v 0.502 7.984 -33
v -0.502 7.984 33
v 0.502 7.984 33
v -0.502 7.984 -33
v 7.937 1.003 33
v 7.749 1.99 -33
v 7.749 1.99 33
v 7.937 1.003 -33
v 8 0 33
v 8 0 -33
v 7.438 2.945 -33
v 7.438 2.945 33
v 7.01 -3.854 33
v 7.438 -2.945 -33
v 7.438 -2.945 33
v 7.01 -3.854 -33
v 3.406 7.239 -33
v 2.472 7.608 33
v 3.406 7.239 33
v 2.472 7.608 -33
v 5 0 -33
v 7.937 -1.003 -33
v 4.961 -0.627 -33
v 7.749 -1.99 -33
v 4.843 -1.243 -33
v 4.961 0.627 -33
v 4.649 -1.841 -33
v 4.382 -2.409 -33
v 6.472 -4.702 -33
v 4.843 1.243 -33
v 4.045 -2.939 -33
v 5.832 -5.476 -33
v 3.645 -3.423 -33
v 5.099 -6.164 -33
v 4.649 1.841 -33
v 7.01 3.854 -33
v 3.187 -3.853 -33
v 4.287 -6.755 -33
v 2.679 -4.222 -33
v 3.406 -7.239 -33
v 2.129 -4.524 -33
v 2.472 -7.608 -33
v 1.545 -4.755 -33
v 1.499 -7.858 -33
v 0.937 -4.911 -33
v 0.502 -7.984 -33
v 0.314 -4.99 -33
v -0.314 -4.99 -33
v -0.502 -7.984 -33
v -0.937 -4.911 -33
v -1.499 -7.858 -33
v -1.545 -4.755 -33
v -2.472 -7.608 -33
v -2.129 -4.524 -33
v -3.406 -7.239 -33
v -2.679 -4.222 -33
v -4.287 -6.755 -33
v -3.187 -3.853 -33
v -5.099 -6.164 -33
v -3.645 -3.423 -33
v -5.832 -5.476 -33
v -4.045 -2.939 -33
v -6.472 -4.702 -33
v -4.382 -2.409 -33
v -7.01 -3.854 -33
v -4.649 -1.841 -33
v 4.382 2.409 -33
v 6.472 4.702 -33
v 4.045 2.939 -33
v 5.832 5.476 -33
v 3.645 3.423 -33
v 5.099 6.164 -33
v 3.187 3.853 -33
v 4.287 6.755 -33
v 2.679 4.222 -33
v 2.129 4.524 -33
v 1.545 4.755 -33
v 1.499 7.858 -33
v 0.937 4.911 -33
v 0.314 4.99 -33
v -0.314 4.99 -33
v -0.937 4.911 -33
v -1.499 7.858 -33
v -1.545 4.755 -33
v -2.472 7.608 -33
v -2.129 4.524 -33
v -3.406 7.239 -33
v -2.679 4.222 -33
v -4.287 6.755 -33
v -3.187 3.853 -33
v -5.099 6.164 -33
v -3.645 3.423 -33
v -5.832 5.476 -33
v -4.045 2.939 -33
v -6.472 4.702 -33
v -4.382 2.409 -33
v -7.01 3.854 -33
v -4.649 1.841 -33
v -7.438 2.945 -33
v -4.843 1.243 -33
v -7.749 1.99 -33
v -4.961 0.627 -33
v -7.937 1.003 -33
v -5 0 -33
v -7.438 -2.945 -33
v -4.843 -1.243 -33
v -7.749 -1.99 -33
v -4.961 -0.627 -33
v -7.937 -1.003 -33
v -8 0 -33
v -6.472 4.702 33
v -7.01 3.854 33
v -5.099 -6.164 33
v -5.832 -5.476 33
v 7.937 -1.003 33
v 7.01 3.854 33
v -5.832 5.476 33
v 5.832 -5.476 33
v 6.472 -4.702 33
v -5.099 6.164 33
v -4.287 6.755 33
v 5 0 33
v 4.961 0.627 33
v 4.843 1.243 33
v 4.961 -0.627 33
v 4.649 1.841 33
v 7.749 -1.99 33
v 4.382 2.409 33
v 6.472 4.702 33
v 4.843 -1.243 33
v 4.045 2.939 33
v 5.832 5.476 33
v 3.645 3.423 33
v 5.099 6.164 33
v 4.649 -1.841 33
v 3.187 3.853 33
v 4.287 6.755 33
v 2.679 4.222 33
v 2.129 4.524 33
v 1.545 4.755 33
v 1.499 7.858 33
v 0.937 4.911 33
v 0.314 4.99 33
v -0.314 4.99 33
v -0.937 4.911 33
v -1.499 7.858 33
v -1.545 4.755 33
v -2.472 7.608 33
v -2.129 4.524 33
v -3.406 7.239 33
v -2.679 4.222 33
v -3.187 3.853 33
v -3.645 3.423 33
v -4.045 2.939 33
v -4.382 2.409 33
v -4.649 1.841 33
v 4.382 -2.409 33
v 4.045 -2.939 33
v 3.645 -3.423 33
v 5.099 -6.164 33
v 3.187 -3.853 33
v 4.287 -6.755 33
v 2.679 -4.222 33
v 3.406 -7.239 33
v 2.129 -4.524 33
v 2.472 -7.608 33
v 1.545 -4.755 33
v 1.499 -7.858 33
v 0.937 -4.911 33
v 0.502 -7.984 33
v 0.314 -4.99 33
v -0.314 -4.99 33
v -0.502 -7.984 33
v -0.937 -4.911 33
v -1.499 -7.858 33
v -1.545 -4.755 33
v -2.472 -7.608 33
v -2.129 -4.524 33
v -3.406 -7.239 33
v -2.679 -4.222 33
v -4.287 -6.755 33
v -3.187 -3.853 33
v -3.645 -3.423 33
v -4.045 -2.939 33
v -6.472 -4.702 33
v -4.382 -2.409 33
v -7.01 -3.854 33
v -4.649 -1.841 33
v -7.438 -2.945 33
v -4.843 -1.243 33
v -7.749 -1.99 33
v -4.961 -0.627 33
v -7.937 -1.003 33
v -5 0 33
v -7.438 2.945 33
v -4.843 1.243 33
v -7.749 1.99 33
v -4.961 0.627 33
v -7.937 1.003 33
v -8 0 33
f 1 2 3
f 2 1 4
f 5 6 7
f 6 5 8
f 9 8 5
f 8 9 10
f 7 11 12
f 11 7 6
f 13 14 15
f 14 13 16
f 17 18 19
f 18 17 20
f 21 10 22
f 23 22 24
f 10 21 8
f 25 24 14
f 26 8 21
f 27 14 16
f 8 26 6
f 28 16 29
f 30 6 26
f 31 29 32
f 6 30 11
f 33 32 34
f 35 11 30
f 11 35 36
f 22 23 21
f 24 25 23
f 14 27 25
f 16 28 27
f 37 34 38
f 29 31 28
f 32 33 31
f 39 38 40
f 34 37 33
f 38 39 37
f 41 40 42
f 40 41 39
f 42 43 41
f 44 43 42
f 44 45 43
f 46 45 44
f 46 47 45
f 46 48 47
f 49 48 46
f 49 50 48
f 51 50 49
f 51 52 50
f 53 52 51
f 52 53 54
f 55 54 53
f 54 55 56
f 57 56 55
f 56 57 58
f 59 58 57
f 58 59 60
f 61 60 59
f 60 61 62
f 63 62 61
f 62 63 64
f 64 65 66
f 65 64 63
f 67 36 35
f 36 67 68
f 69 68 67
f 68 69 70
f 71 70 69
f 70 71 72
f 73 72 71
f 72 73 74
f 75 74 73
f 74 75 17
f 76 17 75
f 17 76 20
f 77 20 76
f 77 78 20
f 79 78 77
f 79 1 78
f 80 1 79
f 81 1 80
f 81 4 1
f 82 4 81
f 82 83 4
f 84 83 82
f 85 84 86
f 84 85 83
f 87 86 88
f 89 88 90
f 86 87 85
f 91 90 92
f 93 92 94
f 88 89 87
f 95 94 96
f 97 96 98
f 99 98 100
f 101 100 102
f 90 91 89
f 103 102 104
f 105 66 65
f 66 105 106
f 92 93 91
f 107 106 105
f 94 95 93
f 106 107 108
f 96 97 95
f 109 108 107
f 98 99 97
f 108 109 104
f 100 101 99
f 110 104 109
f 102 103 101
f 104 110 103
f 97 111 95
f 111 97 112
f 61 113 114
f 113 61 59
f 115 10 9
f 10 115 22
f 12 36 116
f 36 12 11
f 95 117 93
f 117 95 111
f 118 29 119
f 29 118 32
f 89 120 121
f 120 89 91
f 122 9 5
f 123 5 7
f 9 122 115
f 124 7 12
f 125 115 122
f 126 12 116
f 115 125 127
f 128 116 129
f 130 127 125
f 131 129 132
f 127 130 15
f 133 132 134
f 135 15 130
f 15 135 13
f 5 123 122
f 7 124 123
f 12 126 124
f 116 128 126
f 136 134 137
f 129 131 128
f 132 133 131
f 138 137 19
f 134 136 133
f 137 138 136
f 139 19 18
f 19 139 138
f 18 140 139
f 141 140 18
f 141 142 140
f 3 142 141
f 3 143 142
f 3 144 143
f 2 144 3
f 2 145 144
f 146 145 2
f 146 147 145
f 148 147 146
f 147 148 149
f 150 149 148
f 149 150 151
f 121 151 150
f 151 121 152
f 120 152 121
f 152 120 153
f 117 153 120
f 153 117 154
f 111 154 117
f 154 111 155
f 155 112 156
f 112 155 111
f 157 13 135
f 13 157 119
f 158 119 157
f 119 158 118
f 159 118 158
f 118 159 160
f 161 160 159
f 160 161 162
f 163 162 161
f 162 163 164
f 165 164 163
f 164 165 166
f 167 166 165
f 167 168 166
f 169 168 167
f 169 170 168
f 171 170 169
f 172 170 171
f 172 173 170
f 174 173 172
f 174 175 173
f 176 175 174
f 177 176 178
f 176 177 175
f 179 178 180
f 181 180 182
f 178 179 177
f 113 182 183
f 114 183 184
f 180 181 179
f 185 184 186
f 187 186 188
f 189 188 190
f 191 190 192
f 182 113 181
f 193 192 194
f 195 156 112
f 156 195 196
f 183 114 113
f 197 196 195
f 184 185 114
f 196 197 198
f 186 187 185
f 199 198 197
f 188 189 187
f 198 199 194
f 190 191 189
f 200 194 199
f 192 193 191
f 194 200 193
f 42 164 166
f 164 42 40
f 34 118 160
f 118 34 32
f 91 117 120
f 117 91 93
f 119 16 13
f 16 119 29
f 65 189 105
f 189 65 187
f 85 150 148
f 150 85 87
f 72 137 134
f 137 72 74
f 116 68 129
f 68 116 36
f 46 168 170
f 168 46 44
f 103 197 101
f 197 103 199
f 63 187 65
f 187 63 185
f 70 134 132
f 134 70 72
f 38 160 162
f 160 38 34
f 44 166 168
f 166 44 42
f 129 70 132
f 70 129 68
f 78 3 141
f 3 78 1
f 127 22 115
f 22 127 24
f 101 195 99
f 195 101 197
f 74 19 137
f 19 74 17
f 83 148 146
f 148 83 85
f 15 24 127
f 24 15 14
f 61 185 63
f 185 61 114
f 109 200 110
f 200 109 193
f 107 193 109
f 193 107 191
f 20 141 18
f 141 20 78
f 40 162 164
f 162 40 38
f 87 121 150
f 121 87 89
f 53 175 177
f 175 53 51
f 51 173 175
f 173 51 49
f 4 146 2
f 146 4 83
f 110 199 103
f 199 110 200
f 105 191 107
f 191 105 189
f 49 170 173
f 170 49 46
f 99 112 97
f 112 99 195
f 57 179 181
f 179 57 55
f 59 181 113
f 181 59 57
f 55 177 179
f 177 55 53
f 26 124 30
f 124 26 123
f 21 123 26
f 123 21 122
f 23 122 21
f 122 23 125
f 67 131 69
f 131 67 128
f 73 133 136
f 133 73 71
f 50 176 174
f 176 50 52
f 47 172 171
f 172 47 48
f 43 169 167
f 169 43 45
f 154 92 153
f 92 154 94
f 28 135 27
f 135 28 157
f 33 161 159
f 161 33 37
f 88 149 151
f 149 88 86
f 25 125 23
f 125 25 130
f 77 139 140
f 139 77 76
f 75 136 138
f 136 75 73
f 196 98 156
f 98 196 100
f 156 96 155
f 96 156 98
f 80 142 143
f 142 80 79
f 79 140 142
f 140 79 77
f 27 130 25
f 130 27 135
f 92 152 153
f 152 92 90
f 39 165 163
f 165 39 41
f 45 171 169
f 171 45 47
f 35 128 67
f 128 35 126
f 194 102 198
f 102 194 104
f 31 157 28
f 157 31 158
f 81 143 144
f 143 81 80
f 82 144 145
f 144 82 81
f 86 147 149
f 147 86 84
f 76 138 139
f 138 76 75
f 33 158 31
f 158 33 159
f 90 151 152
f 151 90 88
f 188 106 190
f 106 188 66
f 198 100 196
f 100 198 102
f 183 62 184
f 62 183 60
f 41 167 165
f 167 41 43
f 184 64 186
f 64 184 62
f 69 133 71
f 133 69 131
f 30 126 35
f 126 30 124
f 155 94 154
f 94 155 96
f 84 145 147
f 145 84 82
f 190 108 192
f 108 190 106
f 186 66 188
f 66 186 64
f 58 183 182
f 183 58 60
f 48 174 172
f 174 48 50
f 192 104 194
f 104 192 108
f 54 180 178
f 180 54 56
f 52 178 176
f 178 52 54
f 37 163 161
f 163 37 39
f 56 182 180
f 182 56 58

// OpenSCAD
$fn = 50;


difference() {
	union() {
		translate(v = [0, 0, -33.0000000000]) {
			cylinder(h = 66, r = 8.0000000000);
		}
	}
	union() {
		translate(v = [0, 0, -100.0000000000]) {
			cylinder(h = 200, r = 5.0000000000);
		}
	}
}
